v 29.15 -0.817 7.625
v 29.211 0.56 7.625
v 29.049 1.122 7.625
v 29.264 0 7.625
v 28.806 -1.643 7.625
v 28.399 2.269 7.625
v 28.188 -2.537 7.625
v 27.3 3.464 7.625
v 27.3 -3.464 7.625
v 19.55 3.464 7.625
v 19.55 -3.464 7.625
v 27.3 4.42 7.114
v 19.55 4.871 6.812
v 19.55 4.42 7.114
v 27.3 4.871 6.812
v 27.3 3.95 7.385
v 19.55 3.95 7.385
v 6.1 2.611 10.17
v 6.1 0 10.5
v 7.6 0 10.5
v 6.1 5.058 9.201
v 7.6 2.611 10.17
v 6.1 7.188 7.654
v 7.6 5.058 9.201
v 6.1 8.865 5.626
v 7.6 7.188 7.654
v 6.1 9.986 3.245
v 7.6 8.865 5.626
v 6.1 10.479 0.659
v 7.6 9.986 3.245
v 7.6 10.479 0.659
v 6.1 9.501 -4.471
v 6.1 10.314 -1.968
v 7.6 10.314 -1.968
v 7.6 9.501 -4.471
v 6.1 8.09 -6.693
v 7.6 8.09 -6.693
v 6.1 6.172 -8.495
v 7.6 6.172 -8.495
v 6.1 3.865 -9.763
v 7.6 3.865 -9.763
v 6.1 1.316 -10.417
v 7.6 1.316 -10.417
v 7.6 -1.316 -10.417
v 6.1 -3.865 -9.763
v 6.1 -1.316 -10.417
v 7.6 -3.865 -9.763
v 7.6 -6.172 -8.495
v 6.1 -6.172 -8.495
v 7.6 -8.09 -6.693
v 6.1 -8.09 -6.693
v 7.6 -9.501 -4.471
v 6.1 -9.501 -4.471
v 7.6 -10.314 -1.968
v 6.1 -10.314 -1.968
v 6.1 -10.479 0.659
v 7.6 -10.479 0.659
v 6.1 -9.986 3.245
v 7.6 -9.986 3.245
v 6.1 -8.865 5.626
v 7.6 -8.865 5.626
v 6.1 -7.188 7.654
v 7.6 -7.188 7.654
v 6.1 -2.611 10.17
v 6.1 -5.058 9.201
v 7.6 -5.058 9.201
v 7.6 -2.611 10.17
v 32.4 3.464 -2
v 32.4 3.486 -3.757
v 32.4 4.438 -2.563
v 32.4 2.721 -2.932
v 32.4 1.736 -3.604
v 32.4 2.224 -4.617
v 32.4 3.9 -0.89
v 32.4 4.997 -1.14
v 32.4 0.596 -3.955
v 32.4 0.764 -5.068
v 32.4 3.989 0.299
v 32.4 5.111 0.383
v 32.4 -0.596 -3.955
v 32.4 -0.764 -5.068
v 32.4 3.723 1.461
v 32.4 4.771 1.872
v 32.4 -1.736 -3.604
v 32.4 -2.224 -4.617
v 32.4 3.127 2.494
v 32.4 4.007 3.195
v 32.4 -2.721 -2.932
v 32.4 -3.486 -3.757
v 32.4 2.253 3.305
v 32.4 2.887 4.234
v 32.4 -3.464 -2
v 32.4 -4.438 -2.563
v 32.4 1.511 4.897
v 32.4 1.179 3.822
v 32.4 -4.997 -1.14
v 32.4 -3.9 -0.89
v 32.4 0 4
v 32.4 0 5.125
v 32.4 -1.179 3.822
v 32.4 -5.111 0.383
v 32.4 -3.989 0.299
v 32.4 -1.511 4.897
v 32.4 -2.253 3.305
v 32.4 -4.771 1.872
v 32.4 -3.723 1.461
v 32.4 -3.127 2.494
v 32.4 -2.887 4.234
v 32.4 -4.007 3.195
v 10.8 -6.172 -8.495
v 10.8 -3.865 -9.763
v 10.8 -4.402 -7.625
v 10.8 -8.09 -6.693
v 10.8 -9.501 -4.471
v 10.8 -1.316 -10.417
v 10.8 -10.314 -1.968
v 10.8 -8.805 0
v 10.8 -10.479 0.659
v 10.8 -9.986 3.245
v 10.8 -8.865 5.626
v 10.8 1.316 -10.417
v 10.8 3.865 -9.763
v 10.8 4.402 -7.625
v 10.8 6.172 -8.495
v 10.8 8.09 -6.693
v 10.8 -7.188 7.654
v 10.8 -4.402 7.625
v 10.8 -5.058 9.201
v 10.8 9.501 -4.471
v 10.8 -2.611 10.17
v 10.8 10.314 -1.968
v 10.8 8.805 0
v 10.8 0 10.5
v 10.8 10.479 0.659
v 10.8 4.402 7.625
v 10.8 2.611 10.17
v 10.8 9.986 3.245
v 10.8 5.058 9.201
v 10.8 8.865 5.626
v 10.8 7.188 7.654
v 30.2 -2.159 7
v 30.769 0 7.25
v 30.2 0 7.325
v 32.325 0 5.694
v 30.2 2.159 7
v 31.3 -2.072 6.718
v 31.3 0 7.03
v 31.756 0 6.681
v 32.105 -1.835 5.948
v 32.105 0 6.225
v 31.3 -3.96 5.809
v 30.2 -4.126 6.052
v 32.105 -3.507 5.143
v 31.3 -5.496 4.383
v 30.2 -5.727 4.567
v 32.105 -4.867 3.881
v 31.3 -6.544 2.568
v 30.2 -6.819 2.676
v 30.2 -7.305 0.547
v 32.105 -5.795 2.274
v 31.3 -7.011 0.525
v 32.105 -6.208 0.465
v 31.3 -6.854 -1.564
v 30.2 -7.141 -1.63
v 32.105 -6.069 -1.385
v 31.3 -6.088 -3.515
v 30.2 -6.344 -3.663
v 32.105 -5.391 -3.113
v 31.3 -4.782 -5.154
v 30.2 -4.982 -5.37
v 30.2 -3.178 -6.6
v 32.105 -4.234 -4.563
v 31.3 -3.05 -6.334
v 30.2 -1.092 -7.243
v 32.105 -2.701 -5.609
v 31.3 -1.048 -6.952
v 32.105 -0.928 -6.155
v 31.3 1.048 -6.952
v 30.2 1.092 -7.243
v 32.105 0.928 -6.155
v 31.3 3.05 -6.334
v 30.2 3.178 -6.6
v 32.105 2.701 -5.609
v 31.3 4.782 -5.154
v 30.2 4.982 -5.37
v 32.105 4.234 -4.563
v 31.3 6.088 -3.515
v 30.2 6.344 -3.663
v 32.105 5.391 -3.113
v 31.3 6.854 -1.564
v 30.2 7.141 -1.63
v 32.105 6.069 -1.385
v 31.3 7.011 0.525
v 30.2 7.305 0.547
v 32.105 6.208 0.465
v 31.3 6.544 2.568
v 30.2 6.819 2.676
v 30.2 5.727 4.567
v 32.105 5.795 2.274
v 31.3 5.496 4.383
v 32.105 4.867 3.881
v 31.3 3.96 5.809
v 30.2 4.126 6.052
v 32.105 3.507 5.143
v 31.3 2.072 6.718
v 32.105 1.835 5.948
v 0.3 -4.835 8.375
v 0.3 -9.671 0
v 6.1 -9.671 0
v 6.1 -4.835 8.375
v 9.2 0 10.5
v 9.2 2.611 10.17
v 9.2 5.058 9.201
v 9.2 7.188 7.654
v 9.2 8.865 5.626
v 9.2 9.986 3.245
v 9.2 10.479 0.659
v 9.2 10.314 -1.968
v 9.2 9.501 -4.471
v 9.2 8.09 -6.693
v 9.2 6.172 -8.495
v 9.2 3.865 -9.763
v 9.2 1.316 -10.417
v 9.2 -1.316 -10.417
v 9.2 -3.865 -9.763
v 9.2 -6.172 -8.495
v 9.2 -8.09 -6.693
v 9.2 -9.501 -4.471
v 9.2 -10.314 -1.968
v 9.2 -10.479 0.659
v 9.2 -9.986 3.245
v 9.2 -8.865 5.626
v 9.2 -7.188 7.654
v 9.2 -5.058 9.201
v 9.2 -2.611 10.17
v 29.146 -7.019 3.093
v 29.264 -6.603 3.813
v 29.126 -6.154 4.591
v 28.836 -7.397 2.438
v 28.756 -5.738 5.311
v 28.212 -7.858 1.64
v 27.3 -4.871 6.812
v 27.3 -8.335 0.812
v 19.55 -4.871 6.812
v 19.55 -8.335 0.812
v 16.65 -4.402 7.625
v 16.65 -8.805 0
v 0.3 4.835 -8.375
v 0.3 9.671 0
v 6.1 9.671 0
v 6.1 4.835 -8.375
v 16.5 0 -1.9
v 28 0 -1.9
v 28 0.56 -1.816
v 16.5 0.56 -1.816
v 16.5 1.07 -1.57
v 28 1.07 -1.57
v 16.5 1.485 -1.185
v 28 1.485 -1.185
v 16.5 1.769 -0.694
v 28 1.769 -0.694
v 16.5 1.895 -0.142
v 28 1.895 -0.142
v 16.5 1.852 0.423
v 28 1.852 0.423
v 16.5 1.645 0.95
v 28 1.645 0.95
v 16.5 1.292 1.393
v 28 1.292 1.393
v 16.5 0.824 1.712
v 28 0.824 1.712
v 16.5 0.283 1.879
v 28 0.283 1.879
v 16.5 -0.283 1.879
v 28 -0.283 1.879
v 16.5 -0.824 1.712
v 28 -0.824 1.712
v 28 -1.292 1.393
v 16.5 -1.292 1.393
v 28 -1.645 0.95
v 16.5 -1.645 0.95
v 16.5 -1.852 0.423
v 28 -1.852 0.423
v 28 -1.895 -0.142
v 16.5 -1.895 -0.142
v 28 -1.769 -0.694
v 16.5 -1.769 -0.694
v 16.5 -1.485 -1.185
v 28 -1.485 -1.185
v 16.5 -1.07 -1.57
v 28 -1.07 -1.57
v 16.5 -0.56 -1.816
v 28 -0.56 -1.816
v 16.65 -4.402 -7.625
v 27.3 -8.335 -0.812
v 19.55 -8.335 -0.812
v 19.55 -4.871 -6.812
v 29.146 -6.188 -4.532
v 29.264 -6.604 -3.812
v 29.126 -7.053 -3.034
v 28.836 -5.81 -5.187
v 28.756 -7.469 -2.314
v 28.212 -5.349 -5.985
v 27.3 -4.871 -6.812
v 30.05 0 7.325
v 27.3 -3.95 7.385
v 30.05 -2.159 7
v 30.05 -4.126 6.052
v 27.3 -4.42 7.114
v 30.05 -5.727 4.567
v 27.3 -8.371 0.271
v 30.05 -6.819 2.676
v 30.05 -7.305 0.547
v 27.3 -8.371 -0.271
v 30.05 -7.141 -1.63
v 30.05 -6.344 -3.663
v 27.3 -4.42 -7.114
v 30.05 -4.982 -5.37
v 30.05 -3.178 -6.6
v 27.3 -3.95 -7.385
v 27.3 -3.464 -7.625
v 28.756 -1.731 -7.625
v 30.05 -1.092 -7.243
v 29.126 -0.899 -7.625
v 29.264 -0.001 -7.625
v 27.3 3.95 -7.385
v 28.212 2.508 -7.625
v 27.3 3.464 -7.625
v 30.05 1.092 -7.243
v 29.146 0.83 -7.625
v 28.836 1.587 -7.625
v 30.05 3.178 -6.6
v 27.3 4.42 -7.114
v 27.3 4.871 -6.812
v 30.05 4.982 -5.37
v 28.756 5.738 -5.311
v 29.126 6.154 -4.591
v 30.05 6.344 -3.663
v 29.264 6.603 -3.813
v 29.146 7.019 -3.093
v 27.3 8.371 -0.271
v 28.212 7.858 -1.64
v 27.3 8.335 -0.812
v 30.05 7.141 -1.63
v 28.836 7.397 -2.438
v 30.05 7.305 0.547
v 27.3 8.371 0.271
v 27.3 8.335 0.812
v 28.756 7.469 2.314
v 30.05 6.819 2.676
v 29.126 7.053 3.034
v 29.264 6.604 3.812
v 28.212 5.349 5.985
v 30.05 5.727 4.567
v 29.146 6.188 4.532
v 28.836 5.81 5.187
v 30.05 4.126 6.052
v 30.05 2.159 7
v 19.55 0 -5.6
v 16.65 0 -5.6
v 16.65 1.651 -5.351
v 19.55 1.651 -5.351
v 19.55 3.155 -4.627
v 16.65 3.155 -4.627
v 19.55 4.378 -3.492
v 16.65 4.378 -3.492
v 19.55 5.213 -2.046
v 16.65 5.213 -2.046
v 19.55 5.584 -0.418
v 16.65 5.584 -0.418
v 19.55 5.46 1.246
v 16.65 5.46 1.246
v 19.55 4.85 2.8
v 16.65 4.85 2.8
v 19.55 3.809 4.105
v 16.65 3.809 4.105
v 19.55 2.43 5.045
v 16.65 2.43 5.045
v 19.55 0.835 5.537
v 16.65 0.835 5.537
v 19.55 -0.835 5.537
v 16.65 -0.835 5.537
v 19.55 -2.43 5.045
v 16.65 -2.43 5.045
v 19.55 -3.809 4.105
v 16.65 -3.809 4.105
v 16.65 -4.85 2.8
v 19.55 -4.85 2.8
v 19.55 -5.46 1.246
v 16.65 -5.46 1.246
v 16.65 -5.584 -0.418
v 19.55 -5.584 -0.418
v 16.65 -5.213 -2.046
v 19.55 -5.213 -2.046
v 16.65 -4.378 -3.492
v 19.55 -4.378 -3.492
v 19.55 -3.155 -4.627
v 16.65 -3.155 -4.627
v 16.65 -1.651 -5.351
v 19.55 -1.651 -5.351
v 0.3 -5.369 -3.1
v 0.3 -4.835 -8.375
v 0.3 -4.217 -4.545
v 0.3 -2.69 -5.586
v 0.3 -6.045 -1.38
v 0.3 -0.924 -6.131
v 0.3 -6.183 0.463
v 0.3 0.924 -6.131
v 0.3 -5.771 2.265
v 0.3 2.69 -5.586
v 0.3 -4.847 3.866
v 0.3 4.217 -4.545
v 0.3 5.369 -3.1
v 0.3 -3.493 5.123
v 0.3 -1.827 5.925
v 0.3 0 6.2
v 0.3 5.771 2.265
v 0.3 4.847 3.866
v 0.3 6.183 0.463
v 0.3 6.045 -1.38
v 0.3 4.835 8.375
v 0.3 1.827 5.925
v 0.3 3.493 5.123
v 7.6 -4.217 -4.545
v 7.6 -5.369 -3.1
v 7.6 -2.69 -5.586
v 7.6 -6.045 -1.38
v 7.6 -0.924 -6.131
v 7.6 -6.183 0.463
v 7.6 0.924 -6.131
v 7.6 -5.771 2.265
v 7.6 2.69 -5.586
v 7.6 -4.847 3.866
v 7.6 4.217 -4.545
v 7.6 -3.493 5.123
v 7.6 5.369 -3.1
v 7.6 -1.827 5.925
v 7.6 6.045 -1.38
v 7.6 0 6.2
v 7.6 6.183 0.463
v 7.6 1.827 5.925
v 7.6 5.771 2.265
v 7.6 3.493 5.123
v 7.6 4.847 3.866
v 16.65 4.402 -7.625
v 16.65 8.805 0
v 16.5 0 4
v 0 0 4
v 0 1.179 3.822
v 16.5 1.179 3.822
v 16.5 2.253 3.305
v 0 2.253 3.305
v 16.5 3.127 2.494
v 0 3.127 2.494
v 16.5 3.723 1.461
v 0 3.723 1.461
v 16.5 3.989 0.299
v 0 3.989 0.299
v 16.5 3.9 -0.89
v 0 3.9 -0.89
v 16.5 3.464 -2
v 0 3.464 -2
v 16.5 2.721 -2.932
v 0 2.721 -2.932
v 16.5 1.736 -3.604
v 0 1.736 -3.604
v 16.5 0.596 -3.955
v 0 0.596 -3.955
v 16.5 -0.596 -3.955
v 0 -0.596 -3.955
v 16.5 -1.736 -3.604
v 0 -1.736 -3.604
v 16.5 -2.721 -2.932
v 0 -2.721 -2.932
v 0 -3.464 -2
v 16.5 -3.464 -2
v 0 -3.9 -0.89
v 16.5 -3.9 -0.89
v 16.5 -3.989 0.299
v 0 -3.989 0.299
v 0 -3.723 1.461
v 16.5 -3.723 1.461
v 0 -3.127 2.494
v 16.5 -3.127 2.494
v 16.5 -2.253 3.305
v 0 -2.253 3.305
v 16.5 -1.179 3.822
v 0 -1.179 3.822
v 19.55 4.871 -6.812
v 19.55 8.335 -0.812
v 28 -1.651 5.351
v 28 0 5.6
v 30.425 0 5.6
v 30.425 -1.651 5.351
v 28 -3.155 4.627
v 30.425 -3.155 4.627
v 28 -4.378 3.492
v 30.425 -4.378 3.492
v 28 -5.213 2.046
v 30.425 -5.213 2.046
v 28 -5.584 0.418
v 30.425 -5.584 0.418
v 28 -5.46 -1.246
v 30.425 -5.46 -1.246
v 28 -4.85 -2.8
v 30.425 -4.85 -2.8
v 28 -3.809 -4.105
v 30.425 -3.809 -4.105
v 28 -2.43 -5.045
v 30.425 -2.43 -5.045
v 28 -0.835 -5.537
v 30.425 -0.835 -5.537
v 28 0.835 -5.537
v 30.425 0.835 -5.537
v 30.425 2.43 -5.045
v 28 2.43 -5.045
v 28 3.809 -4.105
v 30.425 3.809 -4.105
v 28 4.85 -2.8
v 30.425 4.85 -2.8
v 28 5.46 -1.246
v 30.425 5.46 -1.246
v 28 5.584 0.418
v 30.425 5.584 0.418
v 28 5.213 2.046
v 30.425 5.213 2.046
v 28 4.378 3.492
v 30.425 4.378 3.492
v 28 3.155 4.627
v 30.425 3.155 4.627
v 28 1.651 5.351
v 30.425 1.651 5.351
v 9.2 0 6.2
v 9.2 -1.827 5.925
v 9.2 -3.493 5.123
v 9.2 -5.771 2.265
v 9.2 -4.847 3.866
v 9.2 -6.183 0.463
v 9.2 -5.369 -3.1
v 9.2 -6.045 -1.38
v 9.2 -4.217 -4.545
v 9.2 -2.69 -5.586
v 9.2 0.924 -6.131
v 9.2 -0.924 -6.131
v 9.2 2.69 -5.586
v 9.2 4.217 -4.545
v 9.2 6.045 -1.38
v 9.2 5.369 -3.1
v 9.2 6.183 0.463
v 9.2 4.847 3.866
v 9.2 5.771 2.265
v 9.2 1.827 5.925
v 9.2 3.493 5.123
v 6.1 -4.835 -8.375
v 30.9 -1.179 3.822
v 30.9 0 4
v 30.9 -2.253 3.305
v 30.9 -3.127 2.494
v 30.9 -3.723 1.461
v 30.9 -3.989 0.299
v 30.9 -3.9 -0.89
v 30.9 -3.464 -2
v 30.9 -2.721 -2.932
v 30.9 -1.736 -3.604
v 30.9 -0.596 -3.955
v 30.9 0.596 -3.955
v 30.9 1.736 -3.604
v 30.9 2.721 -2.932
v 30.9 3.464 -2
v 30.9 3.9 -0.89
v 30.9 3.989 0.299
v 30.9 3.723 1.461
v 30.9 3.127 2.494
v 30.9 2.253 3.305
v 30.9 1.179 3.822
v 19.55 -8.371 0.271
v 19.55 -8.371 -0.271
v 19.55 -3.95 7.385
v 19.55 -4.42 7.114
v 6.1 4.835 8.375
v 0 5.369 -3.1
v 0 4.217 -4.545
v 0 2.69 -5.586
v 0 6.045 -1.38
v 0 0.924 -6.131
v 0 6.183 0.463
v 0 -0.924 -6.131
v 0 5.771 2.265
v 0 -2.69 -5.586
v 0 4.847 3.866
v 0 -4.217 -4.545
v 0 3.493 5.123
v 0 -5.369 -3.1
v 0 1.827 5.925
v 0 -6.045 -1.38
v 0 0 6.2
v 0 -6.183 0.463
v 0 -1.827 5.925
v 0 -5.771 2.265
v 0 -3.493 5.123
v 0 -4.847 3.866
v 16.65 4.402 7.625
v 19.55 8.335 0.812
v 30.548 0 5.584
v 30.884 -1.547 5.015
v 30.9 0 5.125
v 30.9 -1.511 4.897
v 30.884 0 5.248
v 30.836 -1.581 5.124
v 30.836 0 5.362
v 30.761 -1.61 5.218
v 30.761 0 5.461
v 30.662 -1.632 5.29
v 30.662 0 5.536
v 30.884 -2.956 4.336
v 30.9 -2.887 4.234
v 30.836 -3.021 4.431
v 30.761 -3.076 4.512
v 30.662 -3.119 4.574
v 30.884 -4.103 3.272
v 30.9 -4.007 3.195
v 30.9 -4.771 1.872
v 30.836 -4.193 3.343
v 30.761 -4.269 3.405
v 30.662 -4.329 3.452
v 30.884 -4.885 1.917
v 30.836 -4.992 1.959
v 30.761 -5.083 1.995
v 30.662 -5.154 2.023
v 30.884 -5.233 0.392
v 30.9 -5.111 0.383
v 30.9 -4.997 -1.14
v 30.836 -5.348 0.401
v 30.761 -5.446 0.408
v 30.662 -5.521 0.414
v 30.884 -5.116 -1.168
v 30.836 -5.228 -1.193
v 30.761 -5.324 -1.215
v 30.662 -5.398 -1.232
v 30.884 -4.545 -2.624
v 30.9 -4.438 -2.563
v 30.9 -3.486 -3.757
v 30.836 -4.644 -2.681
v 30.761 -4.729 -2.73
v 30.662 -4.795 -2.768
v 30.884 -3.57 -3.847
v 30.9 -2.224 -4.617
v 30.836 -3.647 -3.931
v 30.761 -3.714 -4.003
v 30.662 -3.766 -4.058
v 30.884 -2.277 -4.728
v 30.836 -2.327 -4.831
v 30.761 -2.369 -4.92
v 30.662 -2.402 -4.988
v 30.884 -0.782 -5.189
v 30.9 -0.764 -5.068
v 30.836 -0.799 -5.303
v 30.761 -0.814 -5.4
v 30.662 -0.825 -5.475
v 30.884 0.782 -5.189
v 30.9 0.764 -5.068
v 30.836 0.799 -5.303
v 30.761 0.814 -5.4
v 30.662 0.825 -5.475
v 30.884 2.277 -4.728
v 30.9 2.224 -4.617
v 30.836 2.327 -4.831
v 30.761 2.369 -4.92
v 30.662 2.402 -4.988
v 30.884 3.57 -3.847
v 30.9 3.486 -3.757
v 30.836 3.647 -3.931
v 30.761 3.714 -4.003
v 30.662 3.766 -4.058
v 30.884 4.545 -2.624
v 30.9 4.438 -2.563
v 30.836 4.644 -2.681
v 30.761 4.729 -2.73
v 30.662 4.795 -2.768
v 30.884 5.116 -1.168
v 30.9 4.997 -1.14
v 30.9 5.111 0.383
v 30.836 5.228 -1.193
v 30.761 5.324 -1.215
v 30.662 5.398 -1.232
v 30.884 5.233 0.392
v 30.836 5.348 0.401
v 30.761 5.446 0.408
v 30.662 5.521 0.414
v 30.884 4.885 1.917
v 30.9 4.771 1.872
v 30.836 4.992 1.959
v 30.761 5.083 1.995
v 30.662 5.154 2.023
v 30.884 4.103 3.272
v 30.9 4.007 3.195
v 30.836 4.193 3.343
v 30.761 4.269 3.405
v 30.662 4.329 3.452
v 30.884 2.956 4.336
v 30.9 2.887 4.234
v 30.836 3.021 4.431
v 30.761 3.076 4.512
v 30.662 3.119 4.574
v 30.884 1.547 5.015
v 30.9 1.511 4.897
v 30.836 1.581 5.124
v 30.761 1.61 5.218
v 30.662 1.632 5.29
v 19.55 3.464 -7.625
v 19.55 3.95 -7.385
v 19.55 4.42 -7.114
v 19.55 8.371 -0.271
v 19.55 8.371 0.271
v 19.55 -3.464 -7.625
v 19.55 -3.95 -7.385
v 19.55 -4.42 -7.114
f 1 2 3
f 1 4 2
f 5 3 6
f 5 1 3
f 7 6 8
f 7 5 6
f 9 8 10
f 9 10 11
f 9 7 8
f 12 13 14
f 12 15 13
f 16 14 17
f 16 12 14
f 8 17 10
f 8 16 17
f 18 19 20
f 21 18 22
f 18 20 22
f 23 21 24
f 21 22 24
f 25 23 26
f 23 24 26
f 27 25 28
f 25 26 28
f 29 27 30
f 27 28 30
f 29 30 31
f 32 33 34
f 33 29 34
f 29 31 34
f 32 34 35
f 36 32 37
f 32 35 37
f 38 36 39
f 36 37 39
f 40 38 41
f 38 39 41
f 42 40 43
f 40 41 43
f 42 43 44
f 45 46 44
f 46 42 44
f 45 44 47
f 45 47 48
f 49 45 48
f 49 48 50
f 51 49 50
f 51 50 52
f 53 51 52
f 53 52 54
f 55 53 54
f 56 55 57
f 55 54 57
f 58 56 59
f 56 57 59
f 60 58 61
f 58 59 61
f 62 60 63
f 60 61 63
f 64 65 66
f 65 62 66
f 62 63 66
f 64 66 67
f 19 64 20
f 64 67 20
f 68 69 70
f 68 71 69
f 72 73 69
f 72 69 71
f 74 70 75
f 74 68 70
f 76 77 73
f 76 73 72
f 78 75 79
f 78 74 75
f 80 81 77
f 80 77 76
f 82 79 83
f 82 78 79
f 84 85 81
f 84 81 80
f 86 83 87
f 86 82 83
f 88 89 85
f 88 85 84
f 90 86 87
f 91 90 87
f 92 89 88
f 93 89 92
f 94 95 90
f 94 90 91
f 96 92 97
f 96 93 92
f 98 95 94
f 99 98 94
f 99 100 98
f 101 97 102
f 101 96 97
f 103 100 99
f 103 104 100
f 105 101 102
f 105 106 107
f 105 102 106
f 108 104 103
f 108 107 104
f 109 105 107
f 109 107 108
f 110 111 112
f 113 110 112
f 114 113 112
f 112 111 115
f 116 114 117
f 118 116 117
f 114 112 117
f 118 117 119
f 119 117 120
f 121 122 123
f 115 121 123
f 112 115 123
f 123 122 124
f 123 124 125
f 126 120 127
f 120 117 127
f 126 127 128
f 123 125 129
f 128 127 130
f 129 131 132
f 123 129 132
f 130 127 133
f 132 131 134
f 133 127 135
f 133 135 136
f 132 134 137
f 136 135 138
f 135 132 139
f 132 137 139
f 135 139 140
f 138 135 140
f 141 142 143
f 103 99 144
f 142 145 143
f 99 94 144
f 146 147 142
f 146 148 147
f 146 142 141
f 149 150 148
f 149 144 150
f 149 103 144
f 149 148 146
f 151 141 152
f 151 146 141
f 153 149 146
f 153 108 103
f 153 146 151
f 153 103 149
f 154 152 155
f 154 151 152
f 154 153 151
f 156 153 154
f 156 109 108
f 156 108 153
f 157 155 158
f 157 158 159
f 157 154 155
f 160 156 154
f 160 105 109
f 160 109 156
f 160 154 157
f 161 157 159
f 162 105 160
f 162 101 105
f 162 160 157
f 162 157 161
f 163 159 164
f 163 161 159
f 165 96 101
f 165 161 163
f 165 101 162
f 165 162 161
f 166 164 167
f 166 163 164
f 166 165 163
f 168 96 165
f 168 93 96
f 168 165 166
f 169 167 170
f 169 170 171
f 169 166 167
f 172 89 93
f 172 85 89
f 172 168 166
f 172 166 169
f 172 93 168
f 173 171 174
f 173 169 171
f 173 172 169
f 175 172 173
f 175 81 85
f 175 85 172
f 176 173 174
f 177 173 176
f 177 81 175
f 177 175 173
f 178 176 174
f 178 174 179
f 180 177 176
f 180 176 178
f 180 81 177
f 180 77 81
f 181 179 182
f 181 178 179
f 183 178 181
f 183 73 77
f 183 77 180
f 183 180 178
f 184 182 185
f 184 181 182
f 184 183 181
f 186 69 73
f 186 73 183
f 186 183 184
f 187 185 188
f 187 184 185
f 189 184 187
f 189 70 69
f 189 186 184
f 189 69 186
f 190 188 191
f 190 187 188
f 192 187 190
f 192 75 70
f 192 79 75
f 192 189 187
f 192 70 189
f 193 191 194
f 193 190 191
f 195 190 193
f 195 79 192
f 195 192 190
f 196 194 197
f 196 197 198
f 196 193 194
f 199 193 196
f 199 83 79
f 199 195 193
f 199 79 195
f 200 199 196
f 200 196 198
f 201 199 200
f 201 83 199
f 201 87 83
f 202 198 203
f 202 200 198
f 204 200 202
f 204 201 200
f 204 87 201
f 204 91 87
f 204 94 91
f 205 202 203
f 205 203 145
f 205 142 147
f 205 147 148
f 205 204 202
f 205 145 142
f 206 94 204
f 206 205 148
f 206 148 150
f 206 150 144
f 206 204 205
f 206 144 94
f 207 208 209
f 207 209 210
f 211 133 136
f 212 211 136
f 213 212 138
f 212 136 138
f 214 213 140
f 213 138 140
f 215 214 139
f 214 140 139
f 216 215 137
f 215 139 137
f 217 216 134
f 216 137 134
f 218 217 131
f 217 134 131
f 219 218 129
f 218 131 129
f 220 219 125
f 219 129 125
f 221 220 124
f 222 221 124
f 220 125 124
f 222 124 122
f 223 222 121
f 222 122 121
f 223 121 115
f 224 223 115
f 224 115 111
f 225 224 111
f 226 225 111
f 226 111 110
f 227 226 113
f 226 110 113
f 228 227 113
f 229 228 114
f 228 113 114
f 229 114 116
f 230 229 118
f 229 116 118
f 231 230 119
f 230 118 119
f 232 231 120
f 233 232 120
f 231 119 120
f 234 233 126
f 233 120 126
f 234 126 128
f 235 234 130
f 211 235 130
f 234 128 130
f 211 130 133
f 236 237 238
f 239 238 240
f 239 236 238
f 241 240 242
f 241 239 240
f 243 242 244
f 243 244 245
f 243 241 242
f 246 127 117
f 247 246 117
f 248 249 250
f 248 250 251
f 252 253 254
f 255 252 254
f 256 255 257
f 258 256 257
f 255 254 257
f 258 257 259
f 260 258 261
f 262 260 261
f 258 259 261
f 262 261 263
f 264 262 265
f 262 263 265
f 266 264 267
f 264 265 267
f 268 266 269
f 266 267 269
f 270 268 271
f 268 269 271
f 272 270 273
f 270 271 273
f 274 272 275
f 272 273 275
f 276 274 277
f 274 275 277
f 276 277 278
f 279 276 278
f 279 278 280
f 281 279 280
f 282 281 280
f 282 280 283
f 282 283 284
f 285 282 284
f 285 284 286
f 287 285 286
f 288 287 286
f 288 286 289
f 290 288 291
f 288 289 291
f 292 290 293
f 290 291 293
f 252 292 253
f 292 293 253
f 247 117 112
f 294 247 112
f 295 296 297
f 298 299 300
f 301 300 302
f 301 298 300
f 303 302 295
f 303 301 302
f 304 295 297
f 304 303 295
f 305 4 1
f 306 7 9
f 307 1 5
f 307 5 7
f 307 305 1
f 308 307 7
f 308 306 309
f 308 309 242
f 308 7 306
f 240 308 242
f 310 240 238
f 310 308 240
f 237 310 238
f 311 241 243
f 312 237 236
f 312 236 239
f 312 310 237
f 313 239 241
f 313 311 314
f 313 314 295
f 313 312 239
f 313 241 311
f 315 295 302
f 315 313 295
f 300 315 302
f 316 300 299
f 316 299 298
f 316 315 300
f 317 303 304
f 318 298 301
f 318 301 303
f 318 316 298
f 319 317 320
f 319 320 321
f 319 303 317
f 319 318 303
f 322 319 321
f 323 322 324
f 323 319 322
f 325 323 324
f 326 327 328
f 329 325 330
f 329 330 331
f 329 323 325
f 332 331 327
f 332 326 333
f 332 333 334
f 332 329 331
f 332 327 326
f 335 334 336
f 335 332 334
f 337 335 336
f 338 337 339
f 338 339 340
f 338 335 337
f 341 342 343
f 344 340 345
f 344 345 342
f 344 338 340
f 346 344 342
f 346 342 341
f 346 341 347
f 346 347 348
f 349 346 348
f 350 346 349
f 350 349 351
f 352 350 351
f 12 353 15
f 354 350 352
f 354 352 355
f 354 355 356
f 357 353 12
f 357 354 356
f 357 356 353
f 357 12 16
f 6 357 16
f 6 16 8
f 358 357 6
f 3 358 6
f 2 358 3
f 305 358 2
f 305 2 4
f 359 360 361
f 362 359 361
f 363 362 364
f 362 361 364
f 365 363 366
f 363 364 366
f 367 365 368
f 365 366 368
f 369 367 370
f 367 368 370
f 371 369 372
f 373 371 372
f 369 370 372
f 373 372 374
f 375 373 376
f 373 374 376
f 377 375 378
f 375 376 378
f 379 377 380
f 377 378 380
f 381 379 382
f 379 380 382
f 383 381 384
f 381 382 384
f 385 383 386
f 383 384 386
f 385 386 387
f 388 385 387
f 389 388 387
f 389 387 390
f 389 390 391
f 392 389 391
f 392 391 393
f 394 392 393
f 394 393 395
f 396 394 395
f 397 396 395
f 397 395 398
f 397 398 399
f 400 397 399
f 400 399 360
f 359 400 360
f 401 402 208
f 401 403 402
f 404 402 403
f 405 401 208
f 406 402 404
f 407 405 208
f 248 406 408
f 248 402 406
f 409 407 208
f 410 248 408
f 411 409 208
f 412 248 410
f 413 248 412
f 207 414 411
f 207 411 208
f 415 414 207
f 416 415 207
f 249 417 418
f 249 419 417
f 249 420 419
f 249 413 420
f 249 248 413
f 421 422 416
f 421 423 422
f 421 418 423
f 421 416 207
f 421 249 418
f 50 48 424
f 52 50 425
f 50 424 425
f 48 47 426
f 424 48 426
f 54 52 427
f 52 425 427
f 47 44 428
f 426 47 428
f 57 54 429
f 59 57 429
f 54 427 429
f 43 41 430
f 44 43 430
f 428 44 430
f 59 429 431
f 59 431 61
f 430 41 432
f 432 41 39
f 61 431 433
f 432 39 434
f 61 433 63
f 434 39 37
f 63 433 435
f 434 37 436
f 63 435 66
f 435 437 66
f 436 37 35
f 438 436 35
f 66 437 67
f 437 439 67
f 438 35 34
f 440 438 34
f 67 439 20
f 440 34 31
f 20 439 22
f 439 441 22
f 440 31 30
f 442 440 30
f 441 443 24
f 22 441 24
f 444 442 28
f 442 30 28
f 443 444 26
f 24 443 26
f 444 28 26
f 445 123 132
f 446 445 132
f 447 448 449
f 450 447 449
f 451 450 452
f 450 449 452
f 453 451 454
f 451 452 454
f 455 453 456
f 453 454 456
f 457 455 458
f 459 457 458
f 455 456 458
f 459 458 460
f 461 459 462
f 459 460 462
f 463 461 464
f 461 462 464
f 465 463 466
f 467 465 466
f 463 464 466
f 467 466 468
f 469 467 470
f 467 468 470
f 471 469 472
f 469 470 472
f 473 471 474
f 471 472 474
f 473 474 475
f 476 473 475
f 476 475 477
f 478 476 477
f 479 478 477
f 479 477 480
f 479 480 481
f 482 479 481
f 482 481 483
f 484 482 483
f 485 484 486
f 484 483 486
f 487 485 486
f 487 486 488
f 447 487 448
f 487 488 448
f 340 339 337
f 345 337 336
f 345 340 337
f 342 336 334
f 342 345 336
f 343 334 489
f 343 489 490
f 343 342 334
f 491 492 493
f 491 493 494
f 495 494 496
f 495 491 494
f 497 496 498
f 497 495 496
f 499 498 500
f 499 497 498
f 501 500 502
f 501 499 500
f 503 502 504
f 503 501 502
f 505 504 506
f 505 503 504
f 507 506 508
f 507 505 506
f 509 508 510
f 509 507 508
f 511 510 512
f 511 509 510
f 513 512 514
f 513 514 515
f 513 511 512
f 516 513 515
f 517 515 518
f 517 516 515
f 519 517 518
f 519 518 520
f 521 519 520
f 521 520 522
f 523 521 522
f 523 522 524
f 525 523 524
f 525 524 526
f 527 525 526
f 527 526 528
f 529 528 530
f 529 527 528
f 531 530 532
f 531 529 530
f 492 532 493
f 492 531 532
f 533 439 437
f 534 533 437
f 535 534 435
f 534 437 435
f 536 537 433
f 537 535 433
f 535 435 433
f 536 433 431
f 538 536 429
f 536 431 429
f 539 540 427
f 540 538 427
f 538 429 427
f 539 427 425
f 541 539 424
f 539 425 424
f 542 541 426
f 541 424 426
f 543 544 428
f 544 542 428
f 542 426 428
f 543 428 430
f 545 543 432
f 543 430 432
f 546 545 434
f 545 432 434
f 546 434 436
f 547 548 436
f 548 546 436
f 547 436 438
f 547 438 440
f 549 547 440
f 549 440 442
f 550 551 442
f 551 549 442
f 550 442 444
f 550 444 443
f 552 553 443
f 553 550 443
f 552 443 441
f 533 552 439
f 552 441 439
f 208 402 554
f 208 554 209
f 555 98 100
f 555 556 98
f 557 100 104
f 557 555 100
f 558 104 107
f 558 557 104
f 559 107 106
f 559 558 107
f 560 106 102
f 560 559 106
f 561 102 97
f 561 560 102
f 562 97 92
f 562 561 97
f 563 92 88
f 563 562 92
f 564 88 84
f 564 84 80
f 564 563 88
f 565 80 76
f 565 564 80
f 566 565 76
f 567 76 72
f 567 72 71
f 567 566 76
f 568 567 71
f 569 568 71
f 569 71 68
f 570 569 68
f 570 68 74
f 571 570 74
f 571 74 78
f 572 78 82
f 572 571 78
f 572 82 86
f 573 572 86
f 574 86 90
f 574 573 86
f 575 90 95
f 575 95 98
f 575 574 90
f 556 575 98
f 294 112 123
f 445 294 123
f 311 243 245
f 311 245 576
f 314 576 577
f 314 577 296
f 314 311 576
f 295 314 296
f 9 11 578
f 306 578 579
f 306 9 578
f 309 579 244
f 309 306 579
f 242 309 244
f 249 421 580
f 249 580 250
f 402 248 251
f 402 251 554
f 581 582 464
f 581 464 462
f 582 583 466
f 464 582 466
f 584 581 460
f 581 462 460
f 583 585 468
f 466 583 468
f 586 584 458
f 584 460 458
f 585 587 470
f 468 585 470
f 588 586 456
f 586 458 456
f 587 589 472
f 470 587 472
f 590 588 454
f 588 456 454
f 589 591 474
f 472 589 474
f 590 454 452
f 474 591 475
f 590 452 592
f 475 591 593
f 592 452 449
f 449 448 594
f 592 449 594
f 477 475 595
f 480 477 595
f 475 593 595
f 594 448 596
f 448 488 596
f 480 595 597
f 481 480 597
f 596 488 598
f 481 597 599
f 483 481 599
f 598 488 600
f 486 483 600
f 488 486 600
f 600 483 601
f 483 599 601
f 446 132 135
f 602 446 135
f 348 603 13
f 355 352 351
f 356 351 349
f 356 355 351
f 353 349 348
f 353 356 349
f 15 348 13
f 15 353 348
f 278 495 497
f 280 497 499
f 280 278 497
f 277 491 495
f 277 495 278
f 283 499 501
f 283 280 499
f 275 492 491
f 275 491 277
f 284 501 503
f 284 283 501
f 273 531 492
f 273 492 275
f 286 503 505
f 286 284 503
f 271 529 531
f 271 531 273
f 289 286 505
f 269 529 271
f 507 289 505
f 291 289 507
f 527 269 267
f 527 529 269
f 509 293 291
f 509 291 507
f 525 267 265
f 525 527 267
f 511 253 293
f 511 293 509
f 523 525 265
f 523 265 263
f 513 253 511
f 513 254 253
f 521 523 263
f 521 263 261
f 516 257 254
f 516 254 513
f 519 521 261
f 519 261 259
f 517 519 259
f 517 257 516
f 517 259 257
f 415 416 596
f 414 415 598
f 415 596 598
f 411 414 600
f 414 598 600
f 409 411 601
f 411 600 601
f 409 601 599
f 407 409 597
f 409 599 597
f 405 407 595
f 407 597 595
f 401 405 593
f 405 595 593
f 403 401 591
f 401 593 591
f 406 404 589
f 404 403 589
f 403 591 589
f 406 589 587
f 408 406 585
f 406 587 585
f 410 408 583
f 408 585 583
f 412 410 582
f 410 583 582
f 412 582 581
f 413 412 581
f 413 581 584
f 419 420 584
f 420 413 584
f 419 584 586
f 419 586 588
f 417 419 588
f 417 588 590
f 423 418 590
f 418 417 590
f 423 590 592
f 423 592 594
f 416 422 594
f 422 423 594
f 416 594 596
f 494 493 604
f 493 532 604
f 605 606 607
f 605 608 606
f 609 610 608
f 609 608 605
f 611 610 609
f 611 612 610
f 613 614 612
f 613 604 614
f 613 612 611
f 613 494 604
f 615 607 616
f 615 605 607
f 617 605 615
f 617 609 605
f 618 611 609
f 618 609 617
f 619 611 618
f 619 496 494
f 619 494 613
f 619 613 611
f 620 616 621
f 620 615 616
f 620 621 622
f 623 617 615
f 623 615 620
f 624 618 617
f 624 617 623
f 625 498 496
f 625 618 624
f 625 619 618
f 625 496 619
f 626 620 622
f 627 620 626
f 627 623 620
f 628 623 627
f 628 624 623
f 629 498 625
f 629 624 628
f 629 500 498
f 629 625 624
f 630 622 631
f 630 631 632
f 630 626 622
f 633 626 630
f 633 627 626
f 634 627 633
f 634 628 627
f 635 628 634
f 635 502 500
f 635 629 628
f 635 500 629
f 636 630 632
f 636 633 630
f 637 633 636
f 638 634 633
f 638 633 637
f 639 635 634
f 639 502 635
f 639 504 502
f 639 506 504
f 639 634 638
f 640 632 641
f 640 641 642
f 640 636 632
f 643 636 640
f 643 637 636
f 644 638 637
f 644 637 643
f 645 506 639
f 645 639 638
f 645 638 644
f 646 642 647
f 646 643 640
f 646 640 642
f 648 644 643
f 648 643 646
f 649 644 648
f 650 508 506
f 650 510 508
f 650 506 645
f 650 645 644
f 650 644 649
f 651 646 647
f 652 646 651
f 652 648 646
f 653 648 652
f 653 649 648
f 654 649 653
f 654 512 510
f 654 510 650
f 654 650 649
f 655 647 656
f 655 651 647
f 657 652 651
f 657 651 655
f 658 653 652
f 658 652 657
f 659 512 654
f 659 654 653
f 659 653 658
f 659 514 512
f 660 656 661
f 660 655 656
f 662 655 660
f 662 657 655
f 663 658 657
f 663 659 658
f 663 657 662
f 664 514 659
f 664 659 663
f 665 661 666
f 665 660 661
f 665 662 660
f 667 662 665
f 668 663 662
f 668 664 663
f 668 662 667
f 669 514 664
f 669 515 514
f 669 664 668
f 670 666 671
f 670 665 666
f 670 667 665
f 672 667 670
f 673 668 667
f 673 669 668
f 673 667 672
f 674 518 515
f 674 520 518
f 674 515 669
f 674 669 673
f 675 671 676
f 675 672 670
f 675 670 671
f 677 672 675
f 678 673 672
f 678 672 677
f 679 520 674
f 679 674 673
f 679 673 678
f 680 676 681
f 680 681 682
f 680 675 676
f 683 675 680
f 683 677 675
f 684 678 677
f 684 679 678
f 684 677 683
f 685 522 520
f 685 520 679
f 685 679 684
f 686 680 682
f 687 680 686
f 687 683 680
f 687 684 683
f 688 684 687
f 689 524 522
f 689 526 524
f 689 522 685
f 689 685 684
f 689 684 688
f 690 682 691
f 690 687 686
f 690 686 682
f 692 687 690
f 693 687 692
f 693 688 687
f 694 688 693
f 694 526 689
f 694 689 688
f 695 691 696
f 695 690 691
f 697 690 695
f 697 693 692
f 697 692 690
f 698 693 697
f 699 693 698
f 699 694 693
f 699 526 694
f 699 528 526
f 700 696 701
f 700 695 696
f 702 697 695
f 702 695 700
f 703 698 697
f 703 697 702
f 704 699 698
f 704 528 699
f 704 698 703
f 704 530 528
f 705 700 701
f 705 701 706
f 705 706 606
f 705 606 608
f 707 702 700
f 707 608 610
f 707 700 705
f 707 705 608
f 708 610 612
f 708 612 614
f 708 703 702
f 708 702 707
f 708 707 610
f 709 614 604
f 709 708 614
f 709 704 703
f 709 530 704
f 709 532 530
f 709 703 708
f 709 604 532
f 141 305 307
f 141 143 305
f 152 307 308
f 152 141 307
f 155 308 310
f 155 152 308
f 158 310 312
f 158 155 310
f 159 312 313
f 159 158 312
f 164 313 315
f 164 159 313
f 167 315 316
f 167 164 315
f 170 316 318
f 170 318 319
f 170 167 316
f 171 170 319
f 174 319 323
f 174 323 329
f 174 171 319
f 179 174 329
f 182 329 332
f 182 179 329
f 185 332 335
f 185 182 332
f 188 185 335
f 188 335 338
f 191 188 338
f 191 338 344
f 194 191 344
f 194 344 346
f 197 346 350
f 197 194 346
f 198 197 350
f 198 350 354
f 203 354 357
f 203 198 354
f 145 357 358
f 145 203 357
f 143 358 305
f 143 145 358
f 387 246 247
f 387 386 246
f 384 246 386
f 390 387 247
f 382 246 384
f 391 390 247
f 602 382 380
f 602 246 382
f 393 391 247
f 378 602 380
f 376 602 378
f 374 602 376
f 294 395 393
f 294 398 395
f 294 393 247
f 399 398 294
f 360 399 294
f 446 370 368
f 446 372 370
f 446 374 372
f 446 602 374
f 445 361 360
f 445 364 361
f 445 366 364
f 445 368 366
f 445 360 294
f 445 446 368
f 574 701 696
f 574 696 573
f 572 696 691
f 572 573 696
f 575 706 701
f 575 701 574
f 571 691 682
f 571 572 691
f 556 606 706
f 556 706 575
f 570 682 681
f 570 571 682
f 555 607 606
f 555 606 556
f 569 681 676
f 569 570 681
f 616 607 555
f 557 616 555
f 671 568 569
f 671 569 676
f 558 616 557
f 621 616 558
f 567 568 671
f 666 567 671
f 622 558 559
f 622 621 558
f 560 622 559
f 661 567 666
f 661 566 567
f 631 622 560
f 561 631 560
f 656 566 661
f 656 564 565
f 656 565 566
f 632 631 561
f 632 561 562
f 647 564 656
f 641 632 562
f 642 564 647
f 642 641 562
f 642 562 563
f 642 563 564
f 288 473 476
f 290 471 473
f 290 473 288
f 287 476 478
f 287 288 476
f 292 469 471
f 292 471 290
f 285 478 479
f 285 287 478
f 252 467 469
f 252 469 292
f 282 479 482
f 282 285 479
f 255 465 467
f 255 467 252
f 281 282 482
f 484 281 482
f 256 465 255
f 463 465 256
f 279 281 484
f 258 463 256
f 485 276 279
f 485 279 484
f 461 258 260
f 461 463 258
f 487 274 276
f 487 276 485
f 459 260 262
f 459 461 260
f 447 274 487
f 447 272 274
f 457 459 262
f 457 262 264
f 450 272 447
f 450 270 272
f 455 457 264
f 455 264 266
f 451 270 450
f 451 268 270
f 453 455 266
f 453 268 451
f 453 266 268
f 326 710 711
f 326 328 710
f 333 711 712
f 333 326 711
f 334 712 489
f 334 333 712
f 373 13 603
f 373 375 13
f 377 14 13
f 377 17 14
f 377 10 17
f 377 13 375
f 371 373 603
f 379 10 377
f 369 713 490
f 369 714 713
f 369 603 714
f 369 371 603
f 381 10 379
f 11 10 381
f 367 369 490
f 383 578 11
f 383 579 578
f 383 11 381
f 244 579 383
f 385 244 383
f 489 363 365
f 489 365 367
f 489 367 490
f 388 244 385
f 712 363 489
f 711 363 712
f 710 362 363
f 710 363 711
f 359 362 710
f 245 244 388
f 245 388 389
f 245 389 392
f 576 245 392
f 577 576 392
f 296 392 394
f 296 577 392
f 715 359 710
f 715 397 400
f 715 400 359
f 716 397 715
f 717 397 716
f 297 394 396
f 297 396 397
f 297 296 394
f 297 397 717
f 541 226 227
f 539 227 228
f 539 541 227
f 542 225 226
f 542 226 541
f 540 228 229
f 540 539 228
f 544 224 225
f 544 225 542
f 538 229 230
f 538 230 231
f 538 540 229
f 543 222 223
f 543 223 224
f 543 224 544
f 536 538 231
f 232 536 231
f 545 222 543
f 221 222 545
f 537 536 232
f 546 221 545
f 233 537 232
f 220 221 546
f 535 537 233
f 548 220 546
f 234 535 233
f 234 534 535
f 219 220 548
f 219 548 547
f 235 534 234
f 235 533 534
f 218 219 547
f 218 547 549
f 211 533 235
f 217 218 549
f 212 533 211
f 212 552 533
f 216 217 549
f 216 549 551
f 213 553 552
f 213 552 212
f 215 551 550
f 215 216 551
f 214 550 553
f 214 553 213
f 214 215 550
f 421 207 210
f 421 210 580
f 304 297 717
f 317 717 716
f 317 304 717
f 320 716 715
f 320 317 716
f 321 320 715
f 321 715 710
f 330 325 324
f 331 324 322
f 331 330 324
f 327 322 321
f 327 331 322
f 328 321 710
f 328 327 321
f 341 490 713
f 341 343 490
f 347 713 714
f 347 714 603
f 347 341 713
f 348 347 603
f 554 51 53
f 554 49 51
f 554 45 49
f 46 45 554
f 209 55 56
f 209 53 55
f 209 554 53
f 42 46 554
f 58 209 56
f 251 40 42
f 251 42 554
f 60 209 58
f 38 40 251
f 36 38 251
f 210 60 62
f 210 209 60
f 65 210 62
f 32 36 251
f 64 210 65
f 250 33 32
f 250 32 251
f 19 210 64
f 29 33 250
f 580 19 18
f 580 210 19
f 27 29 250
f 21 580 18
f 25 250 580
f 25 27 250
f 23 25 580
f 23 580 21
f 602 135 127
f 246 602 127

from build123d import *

# Parameters (mm, degrees)
SKETCH1_R           = 6.2
BOSS_EXTRUDE1_DEPTH = 10.8
BOSS_EXTRUDE2_DEPTH = 5.85
SKETCH3_R           = 5.6
BOSS_EXTRUDE3_DEPTH = 11.35
SKETCH4_R           = 10.5
BOSS_EXTRUDE4_DEPTH = 1.6
SKETCH5_R           = 10.5
BOSS_EXTRUDE5_DEPTH = 7.3
SKETCH6_R           = 13.375
CUT_EXTRUDE1_DEPTH  = 5.8
SKETCH7_R           = 4
CUT_EXTRUDE2_DEPTH  = 16.5
SKETCH8_R           = 1.9
CUT_EXTRUDE3_DEPTH  = 11.5
SKETCH10_R          = 12.625
CUT_EXTRUDE4_DEPTH  = 12.85


with BuildPart() as part:
    # Sketch1 → Boss-Extrude1 (new body)
    with BuildSketch(Plane(origin=(0, 0, 0), x_dir=(0, 0, -1), z_dir=(1, 0, 0))):
        with Locations(Location((0, 0, 0), (0, 0, 180))):
            Circle(SKETCH1_R)
    extrude(amount=BOSS_EXTRUDE1_DEPTH)

    # Sketch2 → Boss-Extrude2 (add)
    with BuildSketch(Plane(origin=(10.8, 0, 0), x_dir=(0, 0, -1), z_dir=(1, 0, 0))):
        Polygon((0, -8.804591605), (7.625, -4.402295803), (7.625, 4.402295803), (0, 8.804591605), (-7.625, 4.402295803), (-7.625, -4.402295803), align=None)
    extrude(amount=BOSS_EXTRUDE2_DEPTH)

    # Sketch3 → Boss-Extrude3 (add)
    with BuildSketch(Plane(origin=(16.65, 0, 0), x_dir=(0, 0, -1), z_dir=(1, 0, 0))):
        Circle(SKETCH3_R)
    extrude(amount=BOSS_EXTRUDE3_DEPTH)

    # Sketch4 → Boss-Extrude4 (add)
    with BuildSketch(Plane.ZY.offset(-10.8)):
        Circle(SKETCH4_R)
    extrude(amount=BOSS_EXTRUDE4_DEPTH)

    # Sketch5 → Boss-Extrude5 (add)
    with BuildSketch(Plane.ZY.offset(-7.6)):
        Circle(SKETCH5_R)
    extrude(amount=BOSS_EXTRUDE5_DEPTH)

    # Sketch6 → Cut-Extrude1 (cut)
    with BuildSketch(Plane.ZY.offset(-0.3)):
        Circle(SKETCH6_R)
        Polygon((0, -9.670617009), (8.375, -4.835308504), (8.375, 4.835308504), (0, 9.670617009), (-8.375, 4.835308504), (-8.375, -4.835308504), align=None, mode=Mode.SUBTRACT)
    extrude(amount=-CUT_EXTRUDE1_DEPTH, mode=Mode.SUBTRACT)

    # Sketch7 → Cut-Extrude2 (cut)
    with BuildSketch(Plane.ZY):
        Circle(SKETCH7_R)
    extrude(amount=-CUT_EXTRUDE2_DEPTH, mode=Mode.SUBTRACT)

    # Sketch8 → Cut-Extrude3 (cut)
    with BuildSketch(Plane(origin=(28, 0, 0), x_dir=(0, 0, -1), z_dir=(1, 0, 0))):
        Circle(SKETCH8_R)
    extrude(amount=-CUT_EXTRUDE3_DEPTH, mode=Mode.SUBTRACT)

    # Sketch9 → Revolve1 (revolve)
    with BuildSketch(Plane.XY, mode=Mode.PRIVATE) as revolve1_sk:
        with BuildLine():
            Line((19.55, 8.375), (27.3, 8.375))
            Line((27.3, 8.375), (30.05, 7.325))
            Line((30.05, 7.325), (30.2, 7.325))
            ThreePointArc((30.2, 7.325), (31.755634919, 6.680634919), (32.4, 5.125))
            Line((32.4, 5.125), (32.4, 4))
            Line((32.4, 4), (30.9, 4))
            Line((30.9, 4), (30.9, 5.125))
            ThreePointArc((30.9, 5.125), (30.760875721, 5.460875721), (30.425, 5.6))
            Line((30.425, 5.6), (19.55, 5.6))
            Line((19.55, 5.6), (19.55, 8.375))
        make_face()
    revolve(revolve1_sk.sketch.rotate(Axis((0, 0, 0), (1, 0, 0)), 90), axis=Axis((0, 0, 0), (1, 0, 0)))

    # Sketch10 → Cut-Extrude4 (cut)
    with BuildSketch(Plane(origin=(32.4, 0, 0), x_dir=(0, 0, -1), z_dir=(1, 0, 0))):
        Circle(SKETCH10_R)
        Polygon((7.625, -4.402295803), (7.625, 4.402295803), (0, 8.804591605), (-7.625, 4.402295803), (-7.625, -4.402295803), (0, -8.804591605), align=None, mode=Mode.SUBTRACT)
    extrude(amount=-CUT_EXTRUDE4_DEPTH, mode=Mode.SUBTRACT)


solid = part.part
